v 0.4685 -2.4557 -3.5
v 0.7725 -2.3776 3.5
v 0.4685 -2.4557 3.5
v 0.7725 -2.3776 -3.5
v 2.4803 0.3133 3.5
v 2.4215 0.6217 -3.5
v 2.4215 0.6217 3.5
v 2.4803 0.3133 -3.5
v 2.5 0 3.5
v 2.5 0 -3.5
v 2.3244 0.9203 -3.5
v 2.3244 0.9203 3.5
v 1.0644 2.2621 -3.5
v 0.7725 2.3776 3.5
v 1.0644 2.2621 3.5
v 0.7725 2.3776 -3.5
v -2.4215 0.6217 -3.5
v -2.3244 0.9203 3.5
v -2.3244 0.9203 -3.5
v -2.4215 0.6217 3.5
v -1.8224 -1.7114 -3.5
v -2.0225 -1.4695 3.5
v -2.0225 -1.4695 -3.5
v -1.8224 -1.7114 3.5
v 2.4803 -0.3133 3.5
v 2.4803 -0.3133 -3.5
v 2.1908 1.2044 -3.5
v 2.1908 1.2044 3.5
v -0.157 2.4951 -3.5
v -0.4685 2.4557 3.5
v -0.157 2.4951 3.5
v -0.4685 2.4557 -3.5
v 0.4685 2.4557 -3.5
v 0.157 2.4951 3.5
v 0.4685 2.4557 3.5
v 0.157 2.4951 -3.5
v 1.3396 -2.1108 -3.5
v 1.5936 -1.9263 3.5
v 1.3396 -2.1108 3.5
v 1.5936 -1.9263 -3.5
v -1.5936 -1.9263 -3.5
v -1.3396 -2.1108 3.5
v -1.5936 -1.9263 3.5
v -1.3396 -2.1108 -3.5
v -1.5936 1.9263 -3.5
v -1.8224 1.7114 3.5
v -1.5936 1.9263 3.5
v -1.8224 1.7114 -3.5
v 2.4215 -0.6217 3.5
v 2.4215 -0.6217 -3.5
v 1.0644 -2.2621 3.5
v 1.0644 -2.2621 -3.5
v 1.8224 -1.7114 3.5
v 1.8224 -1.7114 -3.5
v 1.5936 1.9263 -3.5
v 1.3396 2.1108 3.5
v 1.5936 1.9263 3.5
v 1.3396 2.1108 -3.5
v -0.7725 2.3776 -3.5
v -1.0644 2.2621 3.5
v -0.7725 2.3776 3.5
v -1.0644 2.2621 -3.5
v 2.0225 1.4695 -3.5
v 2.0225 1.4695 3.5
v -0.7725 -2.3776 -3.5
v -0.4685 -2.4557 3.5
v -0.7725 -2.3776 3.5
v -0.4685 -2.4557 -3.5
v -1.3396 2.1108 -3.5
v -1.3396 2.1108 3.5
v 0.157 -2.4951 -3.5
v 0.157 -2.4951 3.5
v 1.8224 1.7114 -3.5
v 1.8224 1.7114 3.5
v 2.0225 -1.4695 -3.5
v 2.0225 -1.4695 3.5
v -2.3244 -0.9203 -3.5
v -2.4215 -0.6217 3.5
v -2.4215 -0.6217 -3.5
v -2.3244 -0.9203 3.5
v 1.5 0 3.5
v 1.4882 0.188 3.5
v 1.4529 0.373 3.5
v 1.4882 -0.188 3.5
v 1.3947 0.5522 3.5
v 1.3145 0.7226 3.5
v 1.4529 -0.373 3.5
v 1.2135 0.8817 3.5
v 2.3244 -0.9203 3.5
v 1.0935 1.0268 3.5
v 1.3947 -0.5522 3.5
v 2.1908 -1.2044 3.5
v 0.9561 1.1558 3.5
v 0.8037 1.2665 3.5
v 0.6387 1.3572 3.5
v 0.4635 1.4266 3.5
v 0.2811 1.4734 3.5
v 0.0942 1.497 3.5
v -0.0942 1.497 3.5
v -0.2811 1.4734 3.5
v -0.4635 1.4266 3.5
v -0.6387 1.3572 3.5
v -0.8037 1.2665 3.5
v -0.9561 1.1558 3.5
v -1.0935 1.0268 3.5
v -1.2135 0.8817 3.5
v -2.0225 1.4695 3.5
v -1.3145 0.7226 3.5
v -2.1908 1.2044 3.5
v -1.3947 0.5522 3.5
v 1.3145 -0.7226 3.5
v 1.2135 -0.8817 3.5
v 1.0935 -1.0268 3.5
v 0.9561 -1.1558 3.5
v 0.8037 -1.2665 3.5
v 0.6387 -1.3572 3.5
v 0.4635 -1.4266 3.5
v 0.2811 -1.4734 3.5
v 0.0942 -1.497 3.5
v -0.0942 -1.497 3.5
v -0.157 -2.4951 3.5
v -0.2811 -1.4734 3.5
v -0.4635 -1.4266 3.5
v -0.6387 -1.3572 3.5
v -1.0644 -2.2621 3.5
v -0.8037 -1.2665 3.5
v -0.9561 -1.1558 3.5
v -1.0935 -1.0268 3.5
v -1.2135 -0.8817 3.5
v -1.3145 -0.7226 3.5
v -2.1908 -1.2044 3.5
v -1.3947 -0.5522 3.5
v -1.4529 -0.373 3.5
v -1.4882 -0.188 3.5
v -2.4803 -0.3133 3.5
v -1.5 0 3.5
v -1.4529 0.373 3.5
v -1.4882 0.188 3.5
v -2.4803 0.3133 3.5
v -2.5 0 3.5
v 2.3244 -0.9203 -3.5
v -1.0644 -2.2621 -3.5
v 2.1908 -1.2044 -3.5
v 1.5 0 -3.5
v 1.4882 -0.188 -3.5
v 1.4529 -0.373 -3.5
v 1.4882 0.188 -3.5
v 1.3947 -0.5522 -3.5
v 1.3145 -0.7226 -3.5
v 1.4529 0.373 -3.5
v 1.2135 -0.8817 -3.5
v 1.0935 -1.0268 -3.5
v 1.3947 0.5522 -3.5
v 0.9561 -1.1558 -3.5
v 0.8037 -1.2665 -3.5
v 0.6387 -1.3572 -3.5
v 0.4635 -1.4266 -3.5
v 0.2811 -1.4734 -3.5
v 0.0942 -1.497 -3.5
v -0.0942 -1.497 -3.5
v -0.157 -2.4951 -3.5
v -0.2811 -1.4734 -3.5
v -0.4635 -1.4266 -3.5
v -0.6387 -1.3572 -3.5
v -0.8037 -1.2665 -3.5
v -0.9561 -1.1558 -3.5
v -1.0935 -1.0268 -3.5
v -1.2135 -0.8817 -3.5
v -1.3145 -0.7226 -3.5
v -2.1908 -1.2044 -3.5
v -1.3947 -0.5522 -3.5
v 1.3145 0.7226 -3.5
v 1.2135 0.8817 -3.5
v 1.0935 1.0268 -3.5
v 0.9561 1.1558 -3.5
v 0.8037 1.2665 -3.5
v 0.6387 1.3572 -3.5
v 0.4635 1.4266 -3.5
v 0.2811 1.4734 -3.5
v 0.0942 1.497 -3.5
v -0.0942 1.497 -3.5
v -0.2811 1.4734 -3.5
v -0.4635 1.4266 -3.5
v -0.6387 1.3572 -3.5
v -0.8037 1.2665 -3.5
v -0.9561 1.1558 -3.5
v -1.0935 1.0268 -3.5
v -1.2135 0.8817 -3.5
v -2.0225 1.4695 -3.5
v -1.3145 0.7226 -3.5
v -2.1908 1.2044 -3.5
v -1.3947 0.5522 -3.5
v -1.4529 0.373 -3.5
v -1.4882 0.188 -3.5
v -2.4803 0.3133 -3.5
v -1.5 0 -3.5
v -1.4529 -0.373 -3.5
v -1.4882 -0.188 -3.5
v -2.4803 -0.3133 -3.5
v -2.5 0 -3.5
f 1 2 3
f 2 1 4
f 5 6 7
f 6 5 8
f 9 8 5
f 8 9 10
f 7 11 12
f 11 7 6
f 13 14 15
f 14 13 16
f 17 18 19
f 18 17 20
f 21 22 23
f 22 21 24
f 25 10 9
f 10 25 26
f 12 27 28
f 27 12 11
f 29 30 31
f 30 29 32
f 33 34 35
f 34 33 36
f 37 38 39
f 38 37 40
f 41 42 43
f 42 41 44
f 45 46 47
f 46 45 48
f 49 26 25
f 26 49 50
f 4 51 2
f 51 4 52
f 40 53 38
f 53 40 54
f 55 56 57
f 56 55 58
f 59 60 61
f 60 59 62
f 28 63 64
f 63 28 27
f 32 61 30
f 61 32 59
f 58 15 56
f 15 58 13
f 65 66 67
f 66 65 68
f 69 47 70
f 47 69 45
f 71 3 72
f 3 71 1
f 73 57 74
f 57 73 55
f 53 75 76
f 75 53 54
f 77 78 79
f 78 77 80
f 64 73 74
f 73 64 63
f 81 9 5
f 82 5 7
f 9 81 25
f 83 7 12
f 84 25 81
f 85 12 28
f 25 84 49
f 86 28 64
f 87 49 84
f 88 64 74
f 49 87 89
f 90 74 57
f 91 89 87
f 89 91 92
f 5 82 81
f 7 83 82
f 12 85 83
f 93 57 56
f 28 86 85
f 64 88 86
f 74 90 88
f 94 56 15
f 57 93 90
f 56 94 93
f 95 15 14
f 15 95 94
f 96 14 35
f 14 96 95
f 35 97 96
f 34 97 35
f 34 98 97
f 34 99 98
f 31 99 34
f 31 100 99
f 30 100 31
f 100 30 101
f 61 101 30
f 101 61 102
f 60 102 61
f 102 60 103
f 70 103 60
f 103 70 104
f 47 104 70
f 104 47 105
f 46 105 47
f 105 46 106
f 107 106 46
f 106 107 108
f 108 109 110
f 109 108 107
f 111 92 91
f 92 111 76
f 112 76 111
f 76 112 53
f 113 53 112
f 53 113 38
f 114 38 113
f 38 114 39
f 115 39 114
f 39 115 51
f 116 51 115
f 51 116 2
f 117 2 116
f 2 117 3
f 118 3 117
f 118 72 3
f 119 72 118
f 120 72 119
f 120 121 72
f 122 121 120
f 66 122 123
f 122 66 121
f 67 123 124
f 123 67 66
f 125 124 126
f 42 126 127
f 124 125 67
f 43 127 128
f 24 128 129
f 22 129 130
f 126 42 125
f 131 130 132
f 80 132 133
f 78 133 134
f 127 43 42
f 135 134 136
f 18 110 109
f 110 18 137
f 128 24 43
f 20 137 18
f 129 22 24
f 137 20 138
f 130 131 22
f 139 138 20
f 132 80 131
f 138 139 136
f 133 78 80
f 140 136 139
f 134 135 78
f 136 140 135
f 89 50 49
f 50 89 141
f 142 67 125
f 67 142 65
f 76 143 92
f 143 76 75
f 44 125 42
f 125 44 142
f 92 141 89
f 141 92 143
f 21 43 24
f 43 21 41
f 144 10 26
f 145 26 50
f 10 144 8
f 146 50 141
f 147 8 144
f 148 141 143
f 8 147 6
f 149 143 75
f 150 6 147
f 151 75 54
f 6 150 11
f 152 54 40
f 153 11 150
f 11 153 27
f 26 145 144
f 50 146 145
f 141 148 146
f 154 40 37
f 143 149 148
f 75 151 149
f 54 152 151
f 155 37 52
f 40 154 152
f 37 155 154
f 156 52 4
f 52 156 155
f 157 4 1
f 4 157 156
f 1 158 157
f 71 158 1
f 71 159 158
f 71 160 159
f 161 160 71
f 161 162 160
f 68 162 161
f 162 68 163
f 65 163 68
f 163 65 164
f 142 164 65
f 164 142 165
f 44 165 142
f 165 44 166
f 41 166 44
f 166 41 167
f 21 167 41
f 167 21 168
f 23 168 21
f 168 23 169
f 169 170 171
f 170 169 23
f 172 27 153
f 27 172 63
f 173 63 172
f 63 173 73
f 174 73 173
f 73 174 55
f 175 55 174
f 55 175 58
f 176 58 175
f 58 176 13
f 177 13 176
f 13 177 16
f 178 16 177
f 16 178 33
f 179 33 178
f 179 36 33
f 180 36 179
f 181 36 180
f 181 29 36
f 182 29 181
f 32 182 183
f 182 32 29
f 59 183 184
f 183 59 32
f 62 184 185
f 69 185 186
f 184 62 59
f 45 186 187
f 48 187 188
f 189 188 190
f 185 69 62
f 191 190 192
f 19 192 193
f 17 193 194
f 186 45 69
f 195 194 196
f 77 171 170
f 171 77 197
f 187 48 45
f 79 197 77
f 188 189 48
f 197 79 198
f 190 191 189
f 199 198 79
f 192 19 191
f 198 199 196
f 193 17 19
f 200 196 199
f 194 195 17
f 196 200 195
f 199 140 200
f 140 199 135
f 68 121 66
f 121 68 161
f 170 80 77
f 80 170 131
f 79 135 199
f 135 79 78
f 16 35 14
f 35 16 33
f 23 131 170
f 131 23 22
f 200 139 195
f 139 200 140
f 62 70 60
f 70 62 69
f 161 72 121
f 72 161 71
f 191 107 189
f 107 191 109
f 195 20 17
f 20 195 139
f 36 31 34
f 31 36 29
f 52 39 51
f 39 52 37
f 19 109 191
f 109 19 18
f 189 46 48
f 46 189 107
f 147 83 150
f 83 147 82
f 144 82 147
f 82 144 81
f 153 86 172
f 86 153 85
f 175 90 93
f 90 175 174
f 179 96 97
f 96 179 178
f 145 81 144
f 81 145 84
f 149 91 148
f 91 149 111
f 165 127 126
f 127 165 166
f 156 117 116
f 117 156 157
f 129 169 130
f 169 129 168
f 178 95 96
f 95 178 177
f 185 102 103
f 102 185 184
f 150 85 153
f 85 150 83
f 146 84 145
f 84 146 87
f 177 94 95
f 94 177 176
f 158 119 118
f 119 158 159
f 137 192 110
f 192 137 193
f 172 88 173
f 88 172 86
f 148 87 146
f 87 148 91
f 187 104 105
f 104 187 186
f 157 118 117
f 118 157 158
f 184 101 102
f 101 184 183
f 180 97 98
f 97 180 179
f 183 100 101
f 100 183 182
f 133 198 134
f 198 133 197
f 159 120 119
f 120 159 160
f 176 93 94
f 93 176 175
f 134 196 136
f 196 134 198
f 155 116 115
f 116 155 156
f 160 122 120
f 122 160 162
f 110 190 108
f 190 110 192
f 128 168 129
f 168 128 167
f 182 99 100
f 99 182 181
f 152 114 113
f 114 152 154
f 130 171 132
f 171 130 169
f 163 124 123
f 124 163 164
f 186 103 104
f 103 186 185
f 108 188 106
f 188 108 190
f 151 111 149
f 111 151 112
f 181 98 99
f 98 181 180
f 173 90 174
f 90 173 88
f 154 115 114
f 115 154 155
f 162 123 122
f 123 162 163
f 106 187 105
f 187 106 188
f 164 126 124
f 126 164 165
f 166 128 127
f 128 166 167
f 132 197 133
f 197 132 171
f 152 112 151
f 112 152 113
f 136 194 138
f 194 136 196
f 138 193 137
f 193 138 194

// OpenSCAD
$fn = 50;


difference() {
	union() {
		translate(v = [0, 0, -3.5000000000]) {
			cylinder(h = 7, r = 2.5000000000);
		}
	}
	union() {
		translate(v = [0, 0, -100.0000000000]) {
			cylinder(h = 200, r = 1.5000000000);
		}
	}
}
